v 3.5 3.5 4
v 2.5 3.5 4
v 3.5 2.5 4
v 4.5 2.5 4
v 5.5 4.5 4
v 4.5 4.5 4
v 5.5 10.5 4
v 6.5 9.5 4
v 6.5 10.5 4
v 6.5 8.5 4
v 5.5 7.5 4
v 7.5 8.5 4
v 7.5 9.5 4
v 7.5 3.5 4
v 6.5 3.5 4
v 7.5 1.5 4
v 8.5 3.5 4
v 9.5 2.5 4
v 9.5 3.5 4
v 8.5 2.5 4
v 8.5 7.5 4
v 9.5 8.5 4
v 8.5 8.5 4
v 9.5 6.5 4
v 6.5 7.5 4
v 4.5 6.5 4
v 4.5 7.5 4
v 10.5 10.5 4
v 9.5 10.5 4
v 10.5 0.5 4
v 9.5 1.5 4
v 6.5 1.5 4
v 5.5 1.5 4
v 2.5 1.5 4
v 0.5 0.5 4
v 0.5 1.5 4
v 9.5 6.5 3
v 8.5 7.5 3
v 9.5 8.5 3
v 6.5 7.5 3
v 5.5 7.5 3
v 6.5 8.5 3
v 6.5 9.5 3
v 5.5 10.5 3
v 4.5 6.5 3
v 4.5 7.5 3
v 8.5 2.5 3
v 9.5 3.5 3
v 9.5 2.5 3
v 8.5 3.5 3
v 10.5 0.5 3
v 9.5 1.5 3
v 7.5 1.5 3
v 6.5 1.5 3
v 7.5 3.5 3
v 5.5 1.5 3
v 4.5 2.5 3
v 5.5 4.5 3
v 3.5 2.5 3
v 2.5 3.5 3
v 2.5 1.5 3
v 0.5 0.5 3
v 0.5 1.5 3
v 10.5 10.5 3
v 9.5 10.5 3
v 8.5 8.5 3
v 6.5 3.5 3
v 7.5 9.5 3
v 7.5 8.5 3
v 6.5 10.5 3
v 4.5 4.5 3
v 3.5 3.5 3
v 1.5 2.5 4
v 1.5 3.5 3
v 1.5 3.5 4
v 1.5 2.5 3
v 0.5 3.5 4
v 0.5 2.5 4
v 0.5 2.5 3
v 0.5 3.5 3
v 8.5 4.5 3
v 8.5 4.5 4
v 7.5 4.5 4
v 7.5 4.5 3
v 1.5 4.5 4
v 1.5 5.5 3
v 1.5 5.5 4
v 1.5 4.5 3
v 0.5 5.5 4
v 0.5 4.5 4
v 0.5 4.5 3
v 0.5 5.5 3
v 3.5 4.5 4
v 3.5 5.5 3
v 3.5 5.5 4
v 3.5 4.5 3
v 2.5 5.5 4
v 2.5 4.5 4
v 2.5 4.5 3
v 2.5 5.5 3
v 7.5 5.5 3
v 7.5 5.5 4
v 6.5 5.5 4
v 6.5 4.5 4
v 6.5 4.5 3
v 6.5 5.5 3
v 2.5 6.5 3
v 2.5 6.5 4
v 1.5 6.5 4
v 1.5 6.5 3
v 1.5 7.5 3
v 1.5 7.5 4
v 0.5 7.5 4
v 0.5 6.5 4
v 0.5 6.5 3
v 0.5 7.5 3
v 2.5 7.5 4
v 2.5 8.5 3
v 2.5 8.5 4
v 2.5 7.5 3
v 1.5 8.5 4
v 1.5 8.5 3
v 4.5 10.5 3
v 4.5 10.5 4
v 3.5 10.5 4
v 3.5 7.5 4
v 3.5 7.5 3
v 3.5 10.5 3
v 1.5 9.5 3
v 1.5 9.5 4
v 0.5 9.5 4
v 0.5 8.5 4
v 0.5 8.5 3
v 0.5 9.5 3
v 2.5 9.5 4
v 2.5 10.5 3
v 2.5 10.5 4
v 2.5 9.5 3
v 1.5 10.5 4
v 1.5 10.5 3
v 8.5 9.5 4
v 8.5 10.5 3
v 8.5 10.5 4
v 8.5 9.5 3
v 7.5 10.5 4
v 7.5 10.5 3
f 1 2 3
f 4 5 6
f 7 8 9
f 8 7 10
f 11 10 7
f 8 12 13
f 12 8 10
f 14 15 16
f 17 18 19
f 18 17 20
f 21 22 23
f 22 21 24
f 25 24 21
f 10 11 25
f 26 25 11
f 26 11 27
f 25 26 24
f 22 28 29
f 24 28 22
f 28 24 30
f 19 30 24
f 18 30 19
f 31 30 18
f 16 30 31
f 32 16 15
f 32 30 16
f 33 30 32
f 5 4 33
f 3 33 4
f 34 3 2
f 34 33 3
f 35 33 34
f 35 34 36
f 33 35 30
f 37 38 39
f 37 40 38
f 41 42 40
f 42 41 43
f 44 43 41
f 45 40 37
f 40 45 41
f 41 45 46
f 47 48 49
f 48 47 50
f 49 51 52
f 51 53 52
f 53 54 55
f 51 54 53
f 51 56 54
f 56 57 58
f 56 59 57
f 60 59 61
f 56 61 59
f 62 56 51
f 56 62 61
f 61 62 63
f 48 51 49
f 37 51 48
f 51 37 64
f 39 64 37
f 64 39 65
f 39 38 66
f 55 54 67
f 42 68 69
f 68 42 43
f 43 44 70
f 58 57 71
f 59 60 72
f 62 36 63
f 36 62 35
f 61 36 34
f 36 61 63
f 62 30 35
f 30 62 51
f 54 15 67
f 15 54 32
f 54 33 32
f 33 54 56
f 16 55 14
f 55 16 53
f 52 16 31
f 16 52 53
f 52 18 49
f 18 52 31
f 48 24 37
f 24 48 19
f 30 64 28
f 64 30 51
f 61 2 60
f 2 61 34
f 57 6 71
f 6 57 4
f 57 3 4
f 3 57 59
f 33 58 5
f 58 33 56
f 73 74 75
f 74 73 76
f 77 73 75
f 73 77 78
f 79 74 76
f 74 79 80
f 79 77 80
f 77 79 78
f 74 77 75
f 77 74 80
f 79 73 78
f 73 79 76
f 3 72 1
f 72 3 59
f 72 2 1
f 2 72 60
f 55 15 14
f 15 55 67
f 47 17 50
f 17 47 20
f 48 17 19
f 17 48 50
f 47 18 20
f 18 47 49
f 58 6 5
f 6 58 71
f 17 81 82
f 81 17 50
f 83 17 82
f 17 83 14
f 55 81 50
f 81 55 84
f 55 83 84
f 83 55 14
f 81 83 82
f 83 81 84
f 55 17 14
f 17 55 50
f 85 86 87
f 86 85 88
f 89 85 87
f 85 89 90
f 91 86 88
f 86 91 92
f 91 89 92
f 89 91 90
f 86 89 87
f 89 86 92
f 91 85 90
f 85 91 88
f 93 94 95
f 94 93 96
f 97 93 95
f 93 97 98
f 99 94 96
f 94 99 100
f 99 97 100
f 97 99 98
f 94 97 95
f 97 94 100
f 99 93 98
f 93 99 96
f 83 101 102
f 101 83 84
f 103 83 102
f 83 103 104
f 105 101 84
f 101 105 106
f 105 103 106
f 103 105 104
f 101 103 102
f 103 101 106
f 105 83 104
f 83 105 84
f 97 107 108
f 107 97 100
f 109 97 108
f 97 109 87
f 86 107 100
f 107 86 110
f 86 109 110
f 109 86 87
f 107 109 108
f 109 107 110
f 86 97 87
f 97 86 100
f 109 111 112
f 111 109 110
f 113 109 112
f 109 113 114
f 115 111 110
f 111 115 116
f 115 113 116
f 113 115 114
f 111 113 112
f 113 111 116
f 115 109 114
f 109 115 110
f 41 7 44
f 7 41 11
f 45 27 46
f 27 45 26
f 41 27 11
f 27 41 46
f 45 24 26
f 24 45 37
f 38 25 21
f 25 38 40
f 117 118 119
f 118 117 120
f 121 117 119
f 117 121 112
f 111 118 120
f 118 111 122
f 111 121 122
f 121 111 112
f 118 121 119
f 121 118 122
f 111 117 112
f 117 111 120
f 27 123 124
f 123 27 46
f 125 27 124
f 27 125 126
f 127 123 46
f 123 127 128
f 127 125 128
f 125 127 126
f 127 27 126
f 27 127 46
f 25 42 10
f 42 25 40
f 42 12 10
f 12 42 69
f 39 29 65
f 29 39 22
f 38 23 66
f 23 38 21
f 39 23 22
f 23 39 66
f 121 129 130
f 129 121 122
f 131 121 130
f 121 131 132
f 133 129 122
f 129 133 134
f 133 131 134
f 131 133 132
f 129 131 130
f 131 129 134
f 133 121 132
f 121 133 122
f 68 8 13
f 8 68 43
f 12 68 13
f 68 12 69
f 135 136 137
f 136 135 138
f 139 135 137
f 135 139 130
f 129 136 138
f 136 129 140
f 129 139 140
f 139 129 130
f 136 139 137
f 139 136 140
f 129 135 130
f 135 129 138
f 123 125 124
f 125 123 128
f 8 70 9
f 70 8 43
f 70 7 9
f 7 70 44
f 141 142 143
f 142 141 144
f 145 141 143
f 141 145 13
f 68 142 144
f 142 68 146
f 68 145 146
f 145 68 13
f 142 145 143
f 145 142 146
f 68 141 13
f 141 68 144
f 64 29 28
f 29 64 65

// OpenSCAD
// file: atoi.scad
function atoi(a)=
(a=="!")?33:
(a=="\"")?34:
(a=="#")?35:
(a=="$")?36:
(a=="%")?37:
(a=="&")?38:
(a=="'")?39:
(a=="(")?40:
(a==")")?41:
(a=="*")?42:
(a=="+")?43:
(a==",")?44:
(a=="-")?45:
(a==".")?46:
(a=="/")?47:
(a=="0")?48:
(a=="1")?49:
(a=="2")?50:
(a=="3")?51:
(a=="4")?52:
(a=="5")?53:
(a=="6")?54:
(a=="7")?55:
(a=="8")?56:
(a=="9")?57:
(a==":")?58:
(a==";")?59:
(a=="<")?60:
(a=="=")?61:
(a==">")?62:
(a=="?")?63:
(a=="@")?64:
(a=="A")?65:
(a=="B")?66:
(a=="C")?67:
(a=="D")?68:
(a=="E")?69:
(a=="F")?70:
(a=="G")?71:
(a=="H")?72:
(a=="I")?73:
(a=="J")?74:
(a=="K")?75:
(a=="L")?76:
(a=="M")?77:
(a=="N")?78:
(a=="O")?79:
(a=="P")?80:
(a=="Q")?81:
(a=="R")?82:
(a=="S")?83:
(a=="T")?84:
(a=="U")?85:
(a=="V")?86:
(a=="W")?87:
(a=="X")?88:
(a=="Y")?89:
(a=="Z")?90:
(a=="[")?91:
(a=="\\")?92:
(a=="]")?93:
(a=="^")?94:
(a=="_")?95:
(a=="`")?96:
(a=="a")?97:
(a=="b")?98:
(a=="c")?99:
(a=="d")?100:
(a=="e")?101:
(a=="f")?102:
(a=="g")?103:
(a=="h")?104:
(a=="i")?105:
(a=="j")?106:
(a=="k")?107:
(a=="l")?108:
(a=="m")?109:
(a=="n")?110:
(a=="o")?111:
(a=="p")?112:
(a=="q")?113:
(a=="r")?114:
(a=="s")?115:
(a=="t")?116:
(a=="u")?117:
(a=="v")?118:
(a=="w")?119:
(a=="x")?120:
(a=="y")?121:
(a=="z")?122:
(a=="{")?123:
(a=="|")?124:
(a=="}")?125:
(a=="~")?126:
(a=="€")?128:
(a=="‚")?130:
(a=="ƒ")?131:
(a=="„")?132:
(a=="…")?133:
(a=="†")?134:
(a=="‡")?135:
(a=="ˆ")?136:
(a=="‰")?137:
(a=="Š")?138:
(a=="‹")?139:
(a=="Œ")?140:
(a=="Ž")?142:
(a=="‘")?145:
(a=="’")?146:
(a=="“")?147:
(a=="”")?148:
(a=="•")?149:
(a=="–")?150:
(a=="—")?151:
(a=="˜")?152:
(a=="™")?153:
(a=="š")?154:
(a=="›")?155:
(a=="œ")?156:
(a=="ž")?158:
(a=="Ÿ")?159:
(a=="¡")?161:
(a=="¢")?162:
(a=="£")?163:
(a=="¤")?164:
(a=="¥")?165:
(a=="¦")?166:
(a=="§")?167:
(a=="¨")?168:
(a=="©")?169:
(a=="ª")?170:
(a=="«")?171:
(a=="¬")?172:
(a=="®")?174:
(a=="¯")?175:
(a=="°")?176:
(a=="±")?177:
(a=="²")?178:
(a=="³")?179:
(a=="´")?180:
(a=="µ")?181:
(a=="¶")?182:
(a=="·")?183:
(a=="¸")?184:
(a=="¹")?185:
(a=="º")?186:
(a=="»")?187:
(a=="¼")?188:
(a=="½")?189:
(a=="¾")?190:
(a=="¿")?191:
(a=="À")?192:
(a=="Á")?193:
(a=="Â")?194:
(a=="Ã")?195:
(a=="Ä")?196:
(a=="Å")?197:
(a=="Æ")?198:
(a=="Ç")?199:
(a=="È")?200:
(a=="É")?201:
(a=="Ê")?202:
(a=="Ë")?203:
(a=="Ì")?204:
(a=="Í")?205:
(a=="Î")?206:
(a=="Ï")?207:
(a=="Ð")?208:
(a=="Ñ")?209:
(a=="Ò")?210:
(a=="Ó")?211:
(a=="Ô")?212:
(a=="Õ")?213:
(a=="Ö")?214:
(a=="×")?215:
(a=="Ø")?216:
(a=="Ù")?217:
(a=="Ú")?218:
(a=="Û")?219:
(a=="Ü")?220:
(a=="Ý")?221:
(a=="Þ")?222:
(a=="ß")?223:
(a=="à")?224:
(a=="á")?225:
(a=="â")?226:
(a=="ã")?227:
(a=="ä")?228:
(a=="å")?229:
(a=="æ")?230:
(a=="ç")?231:
(a=="è")?232:
(a=="é")?233:
(a=="ê")?234:
(a=="ë")?235:
(a=="ì")?236:
(a=="í")?237:
(a=="î")?238:
(a=="ï")?239:
(a=="ð")?240:
(a=="ñ")?241:
(a=="ò")?242:
(a=="ó")?243:
(a=="ô")?244:
(a=="õ")?245:
(a=="ö")?246:
(a=="÷")?247:
(a=="ø")?248:
(a=="ù")?249:
(a=="ú")?250:
(a=="û")?251:
(a=="ü")?252:
(a=="ý")?253:
(a=="þ")?254:
(a=="ÿ")?255:
0;
// file: write.scad
include <atoi.scad>;
module _write(font,s,h,p,i) {
	if(i<len(s)){
		if(s[i]==" "){
			translate([dxf_dim(file = font, name = str(atoi("-"),"_width")),0,0])
				_write(font,s,h,p,i+1);
		}else{
			linear_extrude(height=h) import(font,layer=atoi(s[i]));		
			translate([p+dxf_dim(file = font, name = str(atoi(s[i]),"_width")),0,0])
				_write(font,s,h,p,i+1);
		}
	}
}
module write(s,h,p){
	_write("GaroaHackerClubeBold.dxf",s,h,1,0);
}
module write_custom(font,s,h,p){
	_write(font,s,h,p,0);
}
// main file
use <write.scad>
difference(){
rotate([0,0,0])translate([0,0,0]){
union(){
rotate([180,0,90])translate([1,3,3])write("763",h=5,t=1,center=false);
translate([1,1,3.5])  cube(size = [1,1,1], center=true);
translate([2,1,3.5])  cube(size = [1,1,1], center=true);
translate([3,1,3.5])  cube(size = [1,1,1], center=true);
translate([4,1,3.5])  cube(size = [1,1,1], center=true);
translate([5,1,3.5])  cube(size = [1,1,1], center=true);
translate([6,1,3.5])  cube(size = [1,1,1], center=true);
translate([7,1,3.5])  cube(size = [1,1,1], center=true);
translate([8,1,3.5])  cube(size = [1,1,1], center=true);
translate([9,1,3.5])  cube(size = [1,1,1], center=true);
translate([10,1,3.5])  cube(size = [1,1,1], center=true);
translate([10,1,3.5])  cube(size = [1,1,1], center=true);
translate([10,1,3.5])  cube(size = [1,1,1], center=true);
translate([3,2,3.5])  cube(size = [1,1,1], center=true);
translate([4,2,3.5])  cube(size = [1,1,1], center=true);
translate([5,2,3.5])  cube(size = [1,1,1], center=true);
translate([5,2,3.5])  cube(size = [1,1,1], center=true);
translate([7,2,3.5])  cube(size = [1,1,1], center=true);
translate([7,2,3.5])  cube(size = [1,1,1], center=true);
translate([7,2,3.5])  cube(size = [1,1,1], center=true);
translate([10,2,3.5])  cube(size = [1,1,1], center=true);
translate([1,3,3.5])  cube(size = [1,1,1], center=true);
translate([1,3,3.5])  cube(size = [1,1,1], center=true);
translate([3,3,3.5])  cube(size = [1,1,1], center=true);
translate([3,3,3.5])  cube(size = [1,1,1], center=true);
translate([5,3,3.5])  cube(size = [1,1,1], center=true);
translate([5,3,3.5])  cube(size = [1,1,1], center=true);
translate([7,3,3.5])  cube(size = [1,1,1], center=true);
translate([7,3,3.5])  cube(size = [1,1,1], center=true);
translate([9,3,3.5])  cube(size = [1,1,1], center=true);
translate([10,3,3.5])  cube(size = [1,1,1], center=true);
translate([10,3,3.5])  cube(size = [1,1,1], center=true);
translate([10,3,3.5])  cube(size = [1,1,1], center=true);
translate([10,3,3.5])  cube(size = [1,1,1], center=true);
translate([10,3,3.5])  cube(size = [1,1,1], center=true);
translate([5,4,3.5])  cube(size = [1,1,1], center=true);
translate([5,4,3.5])  cube(size = [1,1,1], center=true);
translate([5,4,3.5])  cube(size = [1,1,1], center=true);
translate([8,4,3.5])  cube(size = [1,1,1], center=true);
translate([8,4,3.5])  cube(size = [1,1,1], center=true);
translate([10,4,3.5])  cube(size = [1,1,1], center=true);
translate([1,5,3.5])  cube(size = [1,1,1], center=true);
translate([1,5,3.5])  cube(size = [1,1,1], center=true);
translate([3,5,3.5])  cube(size = [1,1,1], center=true);
translate([3,5,3.5])  cube(size = [1,1,1], center=true);
translate([3,5,3.5])  cube(size = [1,1,1], center=true);
translate([3,5,3.5])  cube(size = [1,1,1], center=true);
translate([7,5,3.5])  cube(size = [1,1,1], center=true);
translate([7,5,3.5])  cube(size = [1,1,1], center=true);
translate([7,5,3.5])  cube(size = [1,1,1], center=true);
translate([10,5,3.5])  cube(size = [1,1,1], center=true);
translate([10,5,3.5])  cube(size = [1,1,1], center=true);
translate([2,6,3.5])  cube(size = [1,1,1], center=true);
translate([2,6,3.5])  cube(size = [1,1,1], center=true);
translate([2,6,3.5])  cube(size = [1,1,1], center=true);
translate([2,6,3.5])  cube(size = [1,1,1], center=true);
translate([2,6,3.5])  cube(size = [1,1,1], center=true);
translate([2,6,3.5])  cube(size = [1,1,1], center=true);
translate([2,6,3.5])  cube(size = [1,1,1], center=true);
translate([2,6,3.5])  cube(size = [1,1,1], center=true);
translate([10,6,3.5])  cube(size = [1,1,1], center=true);
translate([1,7,3.5])  cube(size = [1,1,1], center=true);
translate([1,7,3.5])  cube(size = [1,1,1], center=true);
translate([1,7,3.5])  cube(size = [1,1,1], center=true);
translate([1,7,3.5])  cube(size = [1,1,1], center=true);
translate([5,7,3.5])  cube(size = [1,1,1], center=true);
translate([6,7,3.5])  cube(size = [1,1,1], center=true);
translate([7,7,3.5])  cube(size = [1,1,1], center=true);
translate([8,7,3.5])  cube(size = [1,1,1], center=true);
translate([9,7,3.5])  cube(size = [1,1,1], center=true);
translate([10,7,3.5])  cube(size = [1,1,1], center=true);
translate([10,7,3.5])  cube(size = [1,1,1], center=true);
translate([2,8,3.5])  cube(size = [1,1,1], center=true);
translate([2,8,3.5])  cube(size = [1,1,1], center=true);
translate([4,8,3.5])  cube(size = [1,1,1], center=true);
translate([4,8,3.5])  cube(size = [1,1,1], center=true);
translate([6,8,3.5])  cube(size = [1,1,1], center=true);
translate([6,8,3.5])  cube(size = [1,1,1], center=true);
translate([6,8,3.5])  cube(size = [1,1,1], center=true);
translate([9,8,3.5])  cube(size = [1,1,1], center=true);
translate([10,8,3.5])  cube(size = [1,1,1], center=true);
translate([1,9,3.5])  cube(size = [1,1,1], center=true);
translate([1,9,3.5])  cube(size = [1,1,1], center=true);
translate([1,9,3.5])  cube(size = [1,1,1], center=true);
translate([4,9,3.5])  cube(size = [1,1,1], center=true);
translate([4,9,3.5])  cube(size = [1,1,1], center=true);
translate([6,9,3.5])  cube(size = [1,1,1], center=true);
translate([7,9,3.5])  cube(size = [1,1,1], center=true);
translate([7,9,3.5])  cube(size = [1,1,1], center=true);
translate([7,9,3.5])  cube(size = [1,1,1], center=true);
translate([10,9,3.5])  cube(size = [1,1,1], center=true);
translate([10,9,3.5])  cube(size = [1,1,1], center=true);
translate([2,10,3.5])  cube(size = [1,1,1], center=true);
translate([2,10,3.5])  cube(size = [1,1,1], center=true);
translate([4,10,3.5])  cube(size = [1,1,1], center=true);
translate([4,10,3.5])  cube(size = [1,1,1], center=true);
translate([6,10,3.5])  cube(size = [1,1,1], center=true);
translate([6,10,3.5])  cube(size = [1,1,1], center=true);
translate([8,10,3.5])  cube(size = [1,1,1], center=true);
translate([8,10,3.5])  cube(size = [1,1,1], center=true);
translate([10,10,3.5])  cube(size = [1,1,1], center=true);
}
}
}
